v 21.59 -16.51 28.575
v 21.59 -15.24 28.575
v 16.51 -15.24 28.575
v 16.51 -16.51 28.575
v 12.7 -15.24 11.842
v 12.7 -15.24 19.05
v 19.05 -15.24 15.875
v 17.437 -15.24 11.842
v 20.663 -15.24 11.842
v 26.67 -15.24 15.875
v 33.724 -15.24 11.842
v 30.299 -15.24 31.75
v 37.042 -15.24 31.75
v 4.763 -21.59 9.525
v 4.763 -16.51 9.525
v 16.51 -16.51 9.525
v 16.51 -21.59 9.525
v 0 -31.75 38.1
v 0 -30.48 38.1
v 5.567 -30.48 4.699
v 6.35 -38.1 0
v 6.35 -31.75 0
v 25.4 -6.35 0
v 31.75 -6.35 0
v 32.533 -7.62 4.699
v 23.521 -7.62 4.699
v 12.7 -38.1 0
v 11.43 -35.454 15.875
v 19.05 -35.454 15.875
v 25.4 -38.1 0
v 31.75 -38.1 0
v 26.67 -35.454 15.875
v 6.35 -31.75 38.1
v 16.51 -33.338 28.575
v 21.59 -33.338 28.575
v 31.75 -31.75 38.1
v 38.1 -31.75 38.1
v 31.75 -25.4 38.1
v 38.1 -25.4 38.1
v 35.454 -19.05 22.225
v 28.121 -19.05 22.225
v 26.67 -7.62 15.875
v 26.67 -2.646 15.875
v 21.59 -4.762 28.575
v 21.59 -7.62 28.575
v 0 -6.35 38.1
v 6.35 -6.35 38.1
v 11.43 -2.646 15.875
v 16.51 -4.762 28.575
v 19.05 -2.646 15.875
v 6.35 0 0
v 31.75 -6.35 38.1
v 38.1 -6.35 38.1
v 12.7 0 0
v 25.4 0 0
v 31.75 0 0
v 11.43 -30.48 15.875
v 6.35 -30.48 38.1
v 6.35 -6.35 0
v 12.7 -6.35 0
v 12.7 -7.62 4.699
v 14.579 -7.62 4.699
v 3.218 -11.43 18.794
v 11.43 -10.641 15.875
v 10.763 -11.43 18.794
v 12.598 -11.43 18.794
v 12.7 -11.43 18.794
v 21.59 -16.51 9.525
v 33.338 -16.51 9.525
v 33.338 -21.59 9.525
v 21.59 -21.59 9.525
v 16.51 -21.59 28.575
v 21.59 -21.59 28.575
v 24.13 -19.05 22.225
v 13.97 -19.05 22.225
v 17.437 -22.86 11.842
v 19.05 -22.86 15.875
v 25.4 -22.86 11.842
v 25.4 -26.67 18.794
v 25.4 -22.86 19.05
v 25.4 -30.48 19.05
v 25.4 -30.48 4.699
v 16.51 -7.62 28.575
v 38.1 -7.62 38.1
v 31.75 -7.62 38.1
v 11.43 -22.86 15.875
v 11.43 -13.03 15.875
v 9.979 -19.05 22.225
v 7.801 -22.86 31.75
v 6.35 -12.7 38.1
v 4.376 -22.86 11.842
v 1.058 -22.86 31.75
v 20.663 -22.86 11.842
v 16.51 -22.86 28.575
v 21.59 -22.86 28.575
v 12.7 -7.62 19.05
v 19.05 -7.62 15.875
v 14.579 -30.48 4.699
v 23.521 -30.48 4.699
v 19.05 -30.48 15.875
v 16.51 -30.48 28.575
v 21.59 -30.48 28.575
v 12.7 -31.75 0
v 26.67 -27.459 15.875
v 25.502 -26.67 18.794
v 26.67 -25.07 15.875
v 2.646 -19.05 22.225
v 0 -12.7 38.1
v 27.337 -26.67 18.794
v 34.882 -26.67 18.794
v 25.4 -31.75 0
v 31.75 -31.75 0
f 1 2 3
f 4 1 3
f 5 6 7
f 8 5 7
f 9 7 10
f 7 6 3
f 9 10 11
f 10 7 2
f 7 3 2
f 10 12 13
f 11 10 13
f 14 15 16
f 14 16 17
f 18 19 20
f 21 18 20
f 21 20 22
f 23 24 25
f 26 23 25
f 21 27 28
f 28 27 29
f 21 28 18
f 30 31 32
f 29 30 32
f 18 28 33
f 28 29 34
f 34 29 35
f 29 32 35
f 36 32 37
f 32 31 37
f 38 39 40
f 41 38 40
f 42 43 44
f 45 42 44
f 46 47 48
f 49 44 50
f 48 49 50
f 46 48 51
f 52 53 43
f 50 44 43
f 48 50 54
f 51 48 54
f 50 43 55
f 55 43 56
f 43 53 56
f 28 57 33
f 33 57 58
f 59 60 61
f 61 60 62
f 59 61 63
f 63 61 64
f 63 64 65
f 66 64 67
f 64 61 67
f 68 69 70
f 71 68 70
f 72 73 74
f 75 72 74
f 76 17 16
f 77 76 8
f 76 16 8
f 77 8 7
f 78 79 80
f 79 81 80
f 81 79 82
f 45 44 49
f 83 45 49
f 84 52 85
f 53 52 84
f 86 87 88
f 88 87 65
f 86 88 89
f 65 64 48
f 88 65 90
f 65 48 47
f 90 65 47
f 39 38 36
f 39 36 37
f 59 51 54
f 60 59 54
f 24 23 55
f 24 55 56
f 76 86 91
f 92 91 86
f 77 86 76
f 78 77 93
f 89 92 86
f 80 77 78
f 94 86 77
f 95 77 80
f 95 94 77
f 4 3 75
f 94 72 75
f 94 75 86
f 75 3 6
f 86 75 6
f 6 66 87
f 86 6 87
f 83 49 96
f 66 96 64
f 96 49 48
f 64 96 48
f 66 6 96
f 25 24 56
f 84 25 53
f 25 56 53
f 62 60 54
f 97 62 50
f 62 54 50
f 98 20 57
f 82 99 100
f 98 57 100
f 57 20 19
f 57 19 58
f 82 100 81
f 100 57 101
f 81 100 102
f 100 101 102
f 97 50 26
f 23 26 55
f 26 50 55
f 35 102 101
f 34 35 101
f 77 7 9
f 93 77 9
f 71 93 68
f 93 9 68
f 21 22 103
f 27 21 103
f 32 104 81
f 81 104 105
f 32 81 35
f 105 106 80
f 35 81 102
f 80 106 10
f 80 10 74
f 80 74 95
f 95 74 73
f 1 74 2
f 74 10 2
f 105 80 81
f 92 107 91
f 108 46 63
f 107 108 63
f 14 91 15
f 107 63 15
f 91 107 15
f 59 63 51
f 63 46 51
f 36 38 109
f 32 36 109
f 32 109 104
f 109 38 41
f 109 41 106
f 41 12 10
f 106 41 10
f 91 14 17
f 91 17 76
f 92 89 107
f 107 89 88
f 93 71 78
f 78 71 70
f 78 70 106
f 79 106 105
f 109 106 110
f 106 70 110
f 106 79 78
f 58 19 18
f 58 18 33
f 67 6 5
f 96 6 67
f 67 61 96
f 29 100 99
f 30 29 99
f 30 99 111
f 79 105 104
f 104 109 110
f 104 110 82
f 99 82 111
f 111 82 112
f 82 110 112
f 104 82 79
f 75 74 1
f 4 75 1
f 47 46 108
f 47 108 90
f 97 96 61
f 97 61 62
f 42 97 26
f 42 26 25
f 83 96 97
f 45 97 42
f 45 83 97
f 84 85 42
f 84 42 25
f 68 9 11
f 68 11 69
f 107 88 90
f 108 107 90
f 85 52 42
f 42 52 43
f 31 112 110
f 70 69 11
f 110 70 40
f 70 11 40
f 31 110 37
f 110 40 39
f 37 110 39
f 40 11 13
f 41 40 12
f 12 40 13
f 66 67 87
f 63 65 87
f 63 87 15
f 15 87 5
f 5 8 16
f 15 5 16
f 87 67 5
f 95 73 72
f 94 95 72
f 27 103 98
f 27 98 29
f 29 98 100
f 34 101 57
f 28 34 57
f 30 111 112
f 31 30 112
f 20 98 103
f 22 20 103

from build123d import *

# Parameters (mm, degrees)
F0_W     = 38.1
F0_H     = 38.1
F1_DEPTH = 38.1
F5_DEPTH = 38.1
F7_DEPTH = 38.1
F8_W     = 25.4
F8_H     = 7.62
F9_DEPTH = 38.1


with BuildPart() as f1:
    # F0 (on Front) → F1 (new body)
    with BuildSketch(Plane.XZ):
        with Locations((19.05, 19.05)):
            Rectangle(F0_W, F0_H)
    extrude(amount=F1_DEPTH)

    # F4 (on face) → F5 (cut)
    with BuildSketch(Plane(origin=(0, 0, 0), x_dir=(-1, 0, 0), z_dir=(0, 1, 0))):
        Polygon((-6.35, 38.1), (-31.75, 38.1), (-26.67, 15.875), (-21.59, 28.575), (-16.51, 28.575), (-11.43, 15.875), align=None)
        Polygon((-31.75, 0), (-38.1, 38.1), (-38.1, 0), align=None)
        Polygon((-19.05, 15.875), (-25.4, 0), (-12.7, 0), align=None)
        Polygon((0, 0), (0, 38.1), (-6.35, 0), align=None)
    extrude(amount=-F5_DEPTH, mode=Mode.SUBTRACT)

    # F6 (on offset) → F7 (cut)
    with BuildSketch(Plane.YZ.offset(38.1)):
        Polygon((-38.1, 38.1), (-38.1, 0), (-31.75, 38.1), align=None)
        Polygon((-19.05, 22.225), (-12.7, 38.1), (-25.4, 38.1), align=None)
        Polygon((-6.35, 38.1), (0, 0), (0, 38.1), align=None)
        Polygon((-31.75, 0), (-6.35, 0), (-11.43, 18.794186), (-16.51, 9.525), (-21.59, 9.525), (-26.67, 18.794186), align=None)
    extrude(amount=-F7_DEPTH, mode=Mode.SUBTRACT)

    # F8 (on offset) → F9 (cut)
    with BuildSketch(Plane.XY.offset(38.1)):
        with Locations((25.4, -11.43)):
            Rectangle(F8_W, F8_H)
        with Locations((12.7, -26.67)):
            Rectangle(F8_W, F8_H)
    extrude(amount=-F9_DEPTH, mode=Mode.SUBTRACT)


solid = f1.part
